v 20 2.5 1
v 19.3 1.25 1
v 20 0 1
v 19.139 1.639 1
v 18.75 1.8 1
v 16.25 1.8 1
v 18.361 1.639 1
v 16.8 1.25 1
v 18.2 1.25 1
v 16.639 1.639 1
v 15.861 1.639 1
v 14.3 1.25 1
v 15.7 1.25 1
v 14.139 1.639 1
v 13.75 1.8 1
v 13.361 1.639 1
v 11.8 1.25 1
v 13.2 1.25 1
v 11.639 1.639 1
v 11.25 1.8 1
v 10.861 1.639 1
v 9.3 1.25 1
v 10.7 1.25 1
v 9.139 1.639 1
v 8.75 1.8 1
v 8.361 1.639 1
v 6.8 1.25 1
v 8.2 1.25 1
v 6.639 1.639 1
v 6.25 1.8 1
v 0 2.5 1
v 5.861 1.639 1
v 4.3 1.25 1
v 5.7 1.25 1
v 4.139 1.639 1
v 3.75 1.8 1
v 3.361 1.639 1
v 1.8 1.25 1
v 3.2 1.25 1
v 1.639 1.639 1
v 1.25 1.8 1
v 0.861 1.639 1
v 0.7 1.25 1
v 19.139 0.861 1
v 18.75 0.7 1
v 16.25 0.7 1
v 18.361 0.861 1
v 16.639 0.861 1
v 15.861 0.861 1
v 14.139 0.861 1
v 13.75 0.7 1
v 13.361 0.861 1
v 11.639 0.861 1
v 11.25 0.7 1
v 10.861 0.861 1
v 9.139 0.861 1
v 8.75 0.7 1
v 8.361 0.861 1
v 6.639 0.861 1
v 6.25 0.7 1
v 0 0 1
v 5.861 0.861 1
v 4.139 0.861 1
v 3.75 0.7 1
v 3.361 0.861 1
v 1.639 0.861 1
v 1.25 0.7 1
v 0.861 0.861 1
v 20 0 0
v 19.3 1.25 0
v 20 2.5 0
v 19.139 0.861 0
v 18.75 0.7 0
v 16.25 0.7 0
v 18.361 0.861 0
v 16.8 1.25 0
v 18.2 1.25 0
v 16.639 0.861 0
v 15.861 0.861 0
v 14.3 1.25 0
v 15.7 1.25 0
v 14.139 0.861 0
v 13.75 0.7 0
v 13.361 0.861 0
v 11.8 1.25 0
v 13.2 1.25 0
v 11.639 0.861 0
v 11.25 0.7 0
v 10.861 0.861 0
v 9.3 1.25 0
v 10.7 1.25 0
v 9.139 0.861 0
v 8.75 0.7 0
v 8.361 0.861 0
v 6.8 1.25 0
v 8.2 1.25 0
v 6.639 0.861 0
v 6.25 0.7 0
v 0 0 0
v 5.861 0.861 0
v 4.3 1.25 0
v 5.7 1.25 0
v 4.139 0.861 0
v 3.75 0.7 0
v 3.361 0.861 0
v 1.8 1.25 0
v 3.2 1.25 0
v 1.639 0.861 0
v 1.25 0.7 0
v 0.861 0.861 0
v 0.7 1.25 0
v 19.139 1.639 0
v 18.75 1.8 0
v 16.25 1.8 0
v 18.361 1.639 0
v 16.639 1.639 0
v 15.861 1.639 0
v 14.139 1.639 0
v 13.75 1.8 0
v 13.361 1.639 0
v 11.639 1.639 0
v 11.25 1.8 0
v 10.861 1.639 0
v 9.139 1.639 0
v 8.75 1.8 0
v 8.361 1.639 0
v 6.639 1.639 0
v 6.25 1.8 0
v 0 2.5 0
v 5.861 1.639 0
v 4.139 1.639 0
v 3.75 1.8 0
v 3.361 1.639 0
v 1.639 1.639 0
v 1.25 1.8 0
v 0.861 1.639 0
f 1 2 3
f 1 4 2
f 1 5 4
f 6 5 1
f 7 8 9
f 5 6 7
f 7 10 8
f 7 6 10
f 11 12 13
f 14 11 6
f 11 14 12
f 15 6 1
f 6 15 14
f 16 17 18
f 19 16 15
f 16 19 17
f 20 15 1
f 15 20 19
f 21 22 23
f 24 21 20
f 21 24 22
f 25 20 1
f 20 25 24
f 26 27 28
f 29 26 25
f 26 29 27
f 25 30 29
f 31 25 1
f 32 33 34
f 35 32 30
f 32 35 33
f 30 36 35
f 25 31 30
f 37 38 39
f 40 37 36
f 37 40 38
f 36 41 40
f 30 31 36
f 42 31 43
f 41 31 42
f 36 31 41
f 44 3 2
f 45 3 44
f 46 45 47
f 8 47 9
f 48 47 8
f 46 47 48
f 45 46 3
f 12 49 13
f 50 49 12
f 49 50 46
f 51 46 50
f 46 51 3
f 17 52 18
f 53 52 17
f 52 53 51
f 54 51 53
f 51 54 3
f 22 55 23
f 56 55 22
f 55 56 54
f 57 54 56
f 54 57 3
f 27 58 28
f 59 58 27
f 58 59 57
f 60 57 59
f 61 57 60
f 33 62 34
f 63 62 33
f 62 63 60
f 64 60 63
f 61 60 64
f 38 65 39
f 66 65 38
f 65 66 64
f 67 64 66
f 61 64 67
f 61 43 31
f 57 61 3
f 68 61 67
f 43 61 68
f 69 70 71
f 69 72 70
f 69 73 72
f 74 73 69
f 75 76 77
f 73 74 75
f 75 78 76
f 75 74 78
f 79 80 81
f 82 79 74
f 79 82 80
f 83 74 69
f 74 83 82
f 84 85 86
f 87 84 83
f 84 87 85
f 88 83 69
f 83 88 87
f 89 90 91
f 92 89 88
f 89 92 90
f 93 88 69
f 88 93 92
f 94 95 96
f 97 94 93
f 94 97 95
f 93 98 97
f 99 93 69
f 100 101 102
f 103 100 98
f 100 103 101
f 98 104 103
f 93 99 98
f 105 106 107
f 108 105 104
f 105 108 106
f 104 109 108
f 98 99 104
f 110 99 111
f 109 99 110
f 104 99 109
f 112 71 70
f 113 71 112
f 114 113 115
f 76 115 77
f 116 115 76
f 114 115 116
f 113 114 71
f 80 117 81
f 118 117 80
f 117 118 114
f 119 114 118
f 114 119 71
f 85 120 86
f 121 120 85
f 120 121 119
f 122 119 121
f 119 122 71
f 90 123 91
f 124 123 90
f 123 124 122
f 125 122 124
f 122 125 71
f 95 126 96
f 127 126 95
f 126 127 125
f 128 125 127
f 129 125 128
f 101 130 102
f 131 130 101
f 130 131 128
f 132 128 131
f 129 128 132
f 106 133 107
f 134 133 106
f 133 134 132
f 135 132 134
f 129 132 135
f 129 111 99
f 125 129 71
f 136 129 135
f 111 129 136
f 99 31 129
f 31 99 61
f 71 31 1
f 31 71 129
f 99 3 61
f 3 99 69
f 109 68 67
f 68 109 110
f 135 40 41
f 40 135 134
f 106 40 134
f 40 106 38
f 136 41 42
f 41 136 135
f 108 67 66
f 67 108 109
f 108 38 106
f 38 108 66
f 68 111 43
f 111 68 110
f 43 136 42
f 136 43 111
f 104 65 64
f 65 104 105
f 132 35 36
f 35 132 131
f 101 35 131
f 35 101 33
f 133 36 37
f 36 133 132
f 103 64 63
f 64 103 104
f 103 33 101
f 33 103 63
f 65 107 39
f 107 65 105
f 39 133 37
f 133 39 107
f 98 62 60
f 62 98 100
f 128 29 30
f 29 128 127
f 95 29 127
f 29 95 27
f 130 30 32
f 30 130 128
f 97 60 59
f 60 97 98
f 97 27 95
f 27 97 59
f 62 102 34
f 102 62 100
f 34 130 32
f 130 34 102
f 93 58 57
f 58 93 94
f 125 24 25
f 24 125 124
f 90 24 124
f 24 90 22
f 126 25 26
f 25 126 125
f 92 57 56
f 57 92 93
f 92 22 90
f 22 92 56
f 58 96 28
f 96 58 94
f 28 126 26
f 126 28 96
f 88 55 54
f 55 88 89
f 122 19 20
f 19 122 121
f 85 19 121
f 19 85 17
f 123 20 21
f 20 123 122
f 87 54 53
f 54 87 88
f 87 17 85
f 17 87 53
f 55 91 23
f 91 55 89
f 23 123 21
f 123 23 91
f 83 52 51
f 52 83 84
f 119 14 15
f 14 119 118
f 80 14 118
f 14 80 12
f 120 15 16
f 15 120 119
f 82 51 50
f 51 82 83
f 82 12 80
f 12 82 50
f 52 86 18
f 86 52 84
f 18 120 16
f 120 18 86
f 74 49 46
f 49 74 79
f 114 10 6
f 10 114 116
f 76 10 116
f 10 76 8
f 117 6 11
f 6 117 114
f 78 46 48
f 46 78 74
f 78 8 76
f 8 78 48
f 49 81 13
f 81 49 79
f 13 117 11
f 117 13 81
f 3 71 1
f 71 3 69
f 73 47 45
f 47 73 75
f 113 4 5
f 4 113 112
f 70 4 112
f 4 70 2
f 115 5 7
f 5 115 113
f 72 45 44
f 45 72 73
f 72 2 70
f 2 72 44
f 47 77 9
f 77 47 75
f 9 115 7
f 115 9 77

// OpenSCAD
module pin_holes(pins = 8){

    height=1;
    
    module hole(){
        difference() {
            cube([2.5,2.5,height]);
            
            translate([2.5/2, 2.5/2])
            cylinder(
                h=height,
                d=1.1,
                $fn=8
            );
        }
    }
    
    for(x=[0:pins-1]){
        translate([2.5*x,0,0])
        hole();
    }
    
}


pin_holes();
